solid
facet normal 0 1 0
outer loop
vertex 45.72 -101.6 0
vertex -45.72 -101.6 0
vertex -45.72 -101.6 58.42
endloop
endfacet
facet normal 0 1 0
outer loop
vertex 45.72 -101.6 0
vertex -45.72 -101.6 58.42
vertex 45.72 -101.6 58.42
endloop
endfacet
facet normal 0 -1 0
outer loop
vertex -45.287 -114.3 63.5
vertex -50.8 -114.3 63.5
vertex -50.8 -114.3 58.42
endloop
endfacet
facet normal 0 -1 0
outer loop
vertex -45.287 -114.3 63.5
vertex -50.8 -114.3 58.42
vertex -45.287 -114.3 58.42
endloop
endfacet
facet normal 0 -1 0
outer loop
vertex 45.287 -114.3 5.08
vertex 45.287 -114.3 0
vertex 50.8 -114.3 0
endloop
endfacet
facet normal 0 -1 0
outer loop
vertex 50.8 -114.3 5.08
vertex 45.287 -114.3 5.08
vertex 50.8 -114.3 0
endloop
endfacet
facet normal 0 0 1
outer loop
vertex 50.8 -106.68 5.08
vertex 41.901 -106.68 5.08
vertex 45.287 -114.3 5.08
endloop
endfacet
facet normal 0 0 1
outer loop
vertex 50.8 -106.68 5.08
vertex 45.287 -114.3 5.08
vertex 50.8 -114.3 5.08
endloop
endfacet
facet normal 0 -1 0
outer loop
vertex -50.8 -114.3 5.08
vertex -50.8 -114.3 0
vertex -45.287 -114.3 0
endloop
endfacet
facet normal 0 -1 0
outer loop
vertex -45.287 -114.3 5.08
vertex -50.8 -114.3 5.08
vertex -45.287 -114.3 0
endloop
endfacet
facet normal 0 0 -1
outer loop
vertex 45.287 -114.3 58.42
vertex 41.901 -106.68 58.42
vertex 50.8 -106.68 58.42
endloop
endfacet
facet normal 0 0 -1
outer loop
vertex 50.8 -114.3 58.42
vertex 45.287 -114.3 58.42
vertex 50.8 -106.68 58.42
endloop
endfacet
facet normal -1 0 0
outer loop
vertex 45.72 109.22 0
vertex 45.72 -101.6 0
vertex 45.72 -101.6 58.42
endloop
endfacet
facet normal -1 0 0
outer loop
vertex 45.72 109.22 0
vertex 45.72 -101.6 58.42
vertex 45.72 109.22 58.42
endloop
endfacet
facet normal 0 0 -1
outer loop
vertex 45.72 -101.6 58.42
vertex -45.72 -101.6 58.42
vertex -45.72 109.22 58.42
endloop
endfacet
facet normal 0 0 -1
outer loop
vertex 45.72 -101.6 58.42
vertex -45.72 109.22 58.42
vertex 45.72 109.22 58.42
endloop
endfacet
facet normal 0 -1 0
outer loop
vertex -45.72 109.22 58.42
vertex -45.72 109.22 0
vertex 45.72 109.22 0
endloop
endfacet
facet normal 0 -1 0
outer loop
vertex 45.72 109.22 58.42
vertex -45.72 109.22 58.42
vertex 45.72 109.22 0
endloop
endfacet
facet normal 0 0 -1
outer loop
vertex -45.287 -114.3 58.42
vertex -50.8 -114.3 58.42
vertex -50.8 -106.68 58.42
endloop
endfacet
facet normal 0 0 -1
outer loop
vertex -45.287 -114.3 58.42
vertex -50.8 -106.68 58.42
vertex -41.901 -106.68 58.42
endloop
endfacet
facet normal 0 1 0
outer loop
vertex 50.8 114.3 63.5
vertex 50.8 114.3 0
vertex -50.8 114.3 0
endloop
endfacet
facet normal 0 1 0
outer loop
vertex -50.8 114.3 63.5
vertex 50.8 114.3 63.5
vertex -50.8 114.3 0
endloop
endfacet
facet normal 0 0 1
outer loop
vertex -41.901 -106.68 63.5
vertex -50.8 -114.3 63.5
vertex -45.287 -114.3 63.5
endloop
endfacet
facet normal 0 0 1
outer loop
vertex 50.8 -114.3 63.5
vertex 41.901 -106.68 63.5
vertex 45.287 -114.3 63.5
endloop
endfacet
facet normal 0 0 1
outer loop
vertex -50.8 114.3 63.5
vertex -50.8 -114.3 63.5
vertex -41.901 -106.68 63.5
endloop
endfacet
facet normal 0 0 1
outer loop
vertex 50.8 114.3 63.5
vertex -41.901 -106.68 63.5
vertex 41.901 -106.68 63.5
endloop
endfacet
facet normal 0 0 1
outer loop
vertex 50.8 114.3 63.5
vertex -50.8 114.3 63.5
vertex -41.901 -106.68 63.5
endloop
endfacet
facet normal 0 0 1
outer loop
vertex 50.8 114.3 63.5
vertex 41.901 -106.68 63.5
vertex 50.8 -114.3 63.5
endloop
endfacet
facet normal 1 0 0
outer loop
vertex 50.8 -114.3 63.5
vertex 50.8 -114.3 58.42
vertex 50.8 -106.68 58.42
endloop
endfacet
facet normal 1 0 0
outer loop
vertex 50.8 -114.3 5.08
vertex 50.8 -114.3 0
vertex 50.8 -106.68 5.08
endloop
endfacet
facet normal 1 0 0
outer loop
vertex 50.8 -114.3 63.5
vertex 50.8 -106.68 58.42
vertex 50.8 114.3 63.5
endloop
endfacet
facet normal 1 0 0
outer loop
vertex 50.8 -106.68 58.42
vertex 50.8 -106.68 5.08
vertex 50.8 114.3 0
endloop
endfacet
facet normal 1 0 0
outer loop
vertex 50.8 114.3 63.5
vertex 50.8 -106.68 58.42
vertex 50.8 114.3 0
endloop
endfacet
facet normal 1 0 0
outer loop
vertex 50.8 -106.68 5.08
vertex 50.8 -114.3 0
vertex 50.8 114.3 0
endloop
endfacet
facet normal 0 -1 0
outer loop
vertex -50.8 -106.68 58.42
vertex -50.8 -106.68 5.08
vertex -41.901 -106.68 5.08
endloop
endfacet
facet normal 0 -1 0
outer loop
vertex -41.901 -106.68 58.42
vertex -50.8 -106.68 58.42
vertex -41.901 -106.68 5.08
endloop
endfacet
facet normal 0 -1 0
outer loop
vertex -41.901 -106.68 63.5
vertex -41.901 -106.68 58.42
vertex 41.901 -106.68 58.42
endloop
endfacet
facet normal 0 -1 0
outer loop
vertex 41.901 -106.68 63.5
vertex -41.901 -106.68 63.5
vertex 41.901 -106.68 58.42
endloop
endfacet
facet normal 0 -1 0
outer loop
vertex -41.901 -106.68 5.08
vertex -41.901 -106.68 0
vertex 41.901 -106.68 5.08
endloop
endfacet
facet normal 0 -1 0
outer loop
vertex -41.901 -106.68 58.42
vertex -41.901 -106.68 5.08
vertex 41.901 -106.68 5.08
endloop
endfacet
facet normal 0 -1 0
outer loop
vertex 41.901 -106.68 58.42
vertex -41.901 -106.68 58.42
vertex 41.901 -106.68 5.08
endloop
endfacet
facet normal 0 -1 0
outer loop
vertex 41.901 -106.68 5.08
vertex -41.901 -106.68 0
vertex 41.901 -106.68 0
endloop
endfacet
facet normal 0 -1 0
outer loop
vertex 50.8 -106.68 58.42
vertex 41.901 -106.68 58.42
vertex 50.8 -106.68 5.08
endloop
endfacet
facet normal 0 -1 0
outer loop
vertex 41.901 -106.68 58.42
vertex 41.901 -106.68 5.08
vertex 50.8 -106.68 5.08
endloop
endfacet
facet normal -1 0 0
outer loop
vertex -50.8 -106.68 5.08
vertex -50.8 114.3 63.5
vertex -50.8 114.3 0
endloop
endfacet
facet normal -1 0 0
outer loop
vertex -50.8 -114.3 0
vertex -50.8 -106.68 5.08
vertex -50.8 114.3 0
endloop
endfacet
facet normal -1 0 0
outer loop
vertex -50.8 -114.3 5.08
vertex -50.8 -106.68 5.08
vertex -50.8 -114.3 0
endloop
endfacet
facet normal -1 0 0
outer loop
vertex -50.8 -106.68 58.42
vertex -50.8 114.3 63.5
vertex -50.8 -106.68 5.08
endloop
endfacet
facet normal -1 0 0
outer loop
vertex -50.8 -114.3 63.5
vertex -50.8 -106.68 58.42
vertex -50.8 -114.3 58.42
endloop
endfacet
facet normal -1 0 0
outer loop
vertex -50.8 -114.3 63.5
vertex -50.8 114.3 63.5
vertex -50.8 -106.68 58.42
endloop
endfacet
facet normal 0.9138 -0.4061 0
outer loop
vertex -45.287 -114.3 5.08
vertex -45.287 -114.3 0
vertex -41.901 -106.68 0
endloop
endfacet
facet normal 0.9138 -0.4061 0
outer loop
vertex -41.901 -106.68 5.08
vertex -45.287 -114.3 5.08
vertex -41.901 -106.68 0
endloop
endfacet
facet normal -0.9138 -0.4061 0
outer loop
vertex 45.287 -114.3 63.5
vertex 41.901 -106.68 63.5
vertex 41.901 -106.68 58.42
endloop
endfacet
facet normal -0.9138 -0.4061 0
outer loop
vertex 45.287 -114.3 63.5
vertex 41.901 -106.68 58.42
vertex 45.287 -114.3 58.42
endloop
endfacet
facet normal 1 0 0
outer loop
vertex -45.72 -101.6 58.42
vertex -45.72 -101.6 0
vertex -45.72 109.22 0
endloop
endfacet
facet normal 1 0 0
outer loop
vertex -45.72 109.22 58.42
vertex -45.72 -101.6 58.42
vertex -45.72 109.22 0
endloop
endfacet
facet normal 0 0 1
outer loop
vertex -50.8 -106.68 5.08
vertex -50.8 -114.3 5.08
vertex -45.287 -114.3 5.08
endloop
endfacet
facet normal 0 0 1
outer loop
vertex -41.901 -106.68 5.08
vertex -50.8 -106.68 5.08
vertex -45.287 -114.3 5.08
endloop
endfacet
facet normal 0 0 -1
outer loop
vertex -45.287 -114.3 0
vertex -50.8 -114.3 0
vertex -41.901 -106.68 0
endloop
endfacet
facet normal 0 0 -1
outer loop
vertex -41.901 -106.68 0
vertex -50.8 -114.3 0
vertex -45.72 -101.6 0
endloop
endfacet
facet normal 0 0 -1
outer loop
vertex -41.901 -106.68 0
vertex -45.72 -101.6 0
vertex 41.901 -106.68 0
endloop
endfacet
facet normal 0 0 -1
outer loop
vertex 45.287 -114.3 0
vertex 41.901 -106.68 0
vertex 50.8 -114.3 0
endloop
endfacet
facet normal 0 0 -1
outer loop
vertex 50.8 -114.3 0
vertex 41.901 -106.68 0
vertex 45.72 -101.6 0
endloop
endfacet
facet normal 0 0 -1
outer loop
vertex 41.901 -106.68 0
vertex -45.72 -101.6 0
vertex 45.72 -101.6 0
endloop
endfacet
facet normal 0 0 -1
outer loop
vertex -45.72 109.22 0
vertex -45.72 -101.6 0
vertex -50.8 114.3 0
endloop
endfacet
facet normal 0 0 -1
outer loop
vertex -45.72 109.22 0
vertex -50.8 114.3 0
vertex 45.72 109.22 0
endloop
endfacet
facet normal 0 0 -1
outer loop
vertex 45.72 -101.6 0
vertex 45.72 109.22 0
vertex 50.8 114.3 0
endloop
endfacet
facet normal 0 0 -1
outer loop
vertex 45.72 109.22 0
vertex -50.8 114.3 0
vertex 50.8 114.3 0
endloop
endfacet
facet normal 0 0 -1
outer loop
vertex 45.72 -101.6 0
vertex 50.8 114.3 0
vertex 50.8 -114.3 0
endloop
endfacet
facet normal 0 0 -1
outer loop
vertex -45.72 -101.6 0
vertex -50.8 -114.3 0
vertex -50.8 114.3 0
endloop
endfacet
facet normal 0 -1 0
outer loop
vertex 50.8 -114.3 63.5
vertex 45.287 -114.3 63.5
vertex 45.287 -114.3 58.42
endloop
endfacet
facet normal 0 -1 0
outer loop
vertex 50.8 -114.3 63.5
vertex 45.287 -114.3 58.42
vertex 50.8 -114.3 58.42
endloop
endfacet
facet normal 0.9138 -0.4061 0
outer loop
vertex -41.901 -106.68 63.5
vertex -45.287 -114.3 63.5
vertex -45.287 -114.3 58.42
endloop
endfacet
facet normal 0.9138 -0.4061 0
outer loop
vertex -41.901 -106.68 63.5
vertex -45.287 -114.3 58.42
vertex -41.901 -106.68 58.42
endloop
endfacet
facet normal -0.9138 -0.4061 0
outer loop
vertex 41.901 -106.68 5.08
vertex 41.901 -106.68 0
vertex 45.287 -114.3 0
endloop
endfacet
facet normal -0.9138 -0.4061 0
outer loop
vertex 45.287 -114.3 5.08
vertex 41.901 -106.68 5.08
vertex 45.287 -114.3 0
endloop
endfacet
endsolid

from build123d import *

# Parameters (mm, degrees)
BOSS_EXTRUDE1_DEPTH = 63.5
BOSS_EXTRUDE2_DEPTH = 5.08
BOSS_EXTRUDE3_START = 63.5
BOSS_EXTRUDE3_DEPTH = 5.08
SHELL1_OUTLINE_W    = 91.44
SHELL1_OUTLINE_H    = 210.82
SHELL1_DEPTH        = 58.42


# Read off the part's stored shape, not the designer's step: Shell1
with BuildPart() as part:
    # Sketch1 → Boss-Extrude1 (new body)
    with BuildSketch(Plane.XY):
        Polygon((-50.8, -106.68), (-41.900534076, -106.68), (41.900534076, -106.68), (50.8, -106.68), (50.8, 114.3), (-50.8, 114.3), align=None)
    extrude(amount=BOSS_EXTRUDE1_DEPTH)

    # Sketch1<4> → Boss-Extrude2 (add)
    with BuildSketch(Plane.XY):
        Polygon((50.8, -106.68), (41.900534076, -106.68), (45.287200742, -114.3), (50.8, -114.3), align=None)
        Polygon((-50.8, -114.3), (-45.287200742, -114.3), (-41.900534076, -106.68), (-50.8, -106.68), align=None)
    extrude(amount=BOSS_EXTRUDE2_DEPTH)

    # Sketch1<5> → Boss-Extrude3 (add)
    with BuildSketch(Plane.XY.offset(BOSS_EXTRUDE3_START)):
        Polygon((-50.8, -114.3), (-45.287200742, -114.3), (-41.900534076, -106.68), (-50.8, -106.68), align=None)
        Polygon((50.8, -106.68), (41.900534076, -106.68), (45.287200742, -114.3), (50.8, -114.3), align=None)
    extrude(amount=-BOSS_EXTRUDE3_DEPTH)

    # Shell1 outline → Shell1 (cut)
    with BuildSketch(Plane.XY):
        with Locations((0, 3.81)):
            Rectangle(SHELL1_OUTLINE_W, SHELL1_OUTLINE_H)
    extrude(amount=SHELL1_DEPTH, mode=Mode.SUBTRACT)


solid = part.part
